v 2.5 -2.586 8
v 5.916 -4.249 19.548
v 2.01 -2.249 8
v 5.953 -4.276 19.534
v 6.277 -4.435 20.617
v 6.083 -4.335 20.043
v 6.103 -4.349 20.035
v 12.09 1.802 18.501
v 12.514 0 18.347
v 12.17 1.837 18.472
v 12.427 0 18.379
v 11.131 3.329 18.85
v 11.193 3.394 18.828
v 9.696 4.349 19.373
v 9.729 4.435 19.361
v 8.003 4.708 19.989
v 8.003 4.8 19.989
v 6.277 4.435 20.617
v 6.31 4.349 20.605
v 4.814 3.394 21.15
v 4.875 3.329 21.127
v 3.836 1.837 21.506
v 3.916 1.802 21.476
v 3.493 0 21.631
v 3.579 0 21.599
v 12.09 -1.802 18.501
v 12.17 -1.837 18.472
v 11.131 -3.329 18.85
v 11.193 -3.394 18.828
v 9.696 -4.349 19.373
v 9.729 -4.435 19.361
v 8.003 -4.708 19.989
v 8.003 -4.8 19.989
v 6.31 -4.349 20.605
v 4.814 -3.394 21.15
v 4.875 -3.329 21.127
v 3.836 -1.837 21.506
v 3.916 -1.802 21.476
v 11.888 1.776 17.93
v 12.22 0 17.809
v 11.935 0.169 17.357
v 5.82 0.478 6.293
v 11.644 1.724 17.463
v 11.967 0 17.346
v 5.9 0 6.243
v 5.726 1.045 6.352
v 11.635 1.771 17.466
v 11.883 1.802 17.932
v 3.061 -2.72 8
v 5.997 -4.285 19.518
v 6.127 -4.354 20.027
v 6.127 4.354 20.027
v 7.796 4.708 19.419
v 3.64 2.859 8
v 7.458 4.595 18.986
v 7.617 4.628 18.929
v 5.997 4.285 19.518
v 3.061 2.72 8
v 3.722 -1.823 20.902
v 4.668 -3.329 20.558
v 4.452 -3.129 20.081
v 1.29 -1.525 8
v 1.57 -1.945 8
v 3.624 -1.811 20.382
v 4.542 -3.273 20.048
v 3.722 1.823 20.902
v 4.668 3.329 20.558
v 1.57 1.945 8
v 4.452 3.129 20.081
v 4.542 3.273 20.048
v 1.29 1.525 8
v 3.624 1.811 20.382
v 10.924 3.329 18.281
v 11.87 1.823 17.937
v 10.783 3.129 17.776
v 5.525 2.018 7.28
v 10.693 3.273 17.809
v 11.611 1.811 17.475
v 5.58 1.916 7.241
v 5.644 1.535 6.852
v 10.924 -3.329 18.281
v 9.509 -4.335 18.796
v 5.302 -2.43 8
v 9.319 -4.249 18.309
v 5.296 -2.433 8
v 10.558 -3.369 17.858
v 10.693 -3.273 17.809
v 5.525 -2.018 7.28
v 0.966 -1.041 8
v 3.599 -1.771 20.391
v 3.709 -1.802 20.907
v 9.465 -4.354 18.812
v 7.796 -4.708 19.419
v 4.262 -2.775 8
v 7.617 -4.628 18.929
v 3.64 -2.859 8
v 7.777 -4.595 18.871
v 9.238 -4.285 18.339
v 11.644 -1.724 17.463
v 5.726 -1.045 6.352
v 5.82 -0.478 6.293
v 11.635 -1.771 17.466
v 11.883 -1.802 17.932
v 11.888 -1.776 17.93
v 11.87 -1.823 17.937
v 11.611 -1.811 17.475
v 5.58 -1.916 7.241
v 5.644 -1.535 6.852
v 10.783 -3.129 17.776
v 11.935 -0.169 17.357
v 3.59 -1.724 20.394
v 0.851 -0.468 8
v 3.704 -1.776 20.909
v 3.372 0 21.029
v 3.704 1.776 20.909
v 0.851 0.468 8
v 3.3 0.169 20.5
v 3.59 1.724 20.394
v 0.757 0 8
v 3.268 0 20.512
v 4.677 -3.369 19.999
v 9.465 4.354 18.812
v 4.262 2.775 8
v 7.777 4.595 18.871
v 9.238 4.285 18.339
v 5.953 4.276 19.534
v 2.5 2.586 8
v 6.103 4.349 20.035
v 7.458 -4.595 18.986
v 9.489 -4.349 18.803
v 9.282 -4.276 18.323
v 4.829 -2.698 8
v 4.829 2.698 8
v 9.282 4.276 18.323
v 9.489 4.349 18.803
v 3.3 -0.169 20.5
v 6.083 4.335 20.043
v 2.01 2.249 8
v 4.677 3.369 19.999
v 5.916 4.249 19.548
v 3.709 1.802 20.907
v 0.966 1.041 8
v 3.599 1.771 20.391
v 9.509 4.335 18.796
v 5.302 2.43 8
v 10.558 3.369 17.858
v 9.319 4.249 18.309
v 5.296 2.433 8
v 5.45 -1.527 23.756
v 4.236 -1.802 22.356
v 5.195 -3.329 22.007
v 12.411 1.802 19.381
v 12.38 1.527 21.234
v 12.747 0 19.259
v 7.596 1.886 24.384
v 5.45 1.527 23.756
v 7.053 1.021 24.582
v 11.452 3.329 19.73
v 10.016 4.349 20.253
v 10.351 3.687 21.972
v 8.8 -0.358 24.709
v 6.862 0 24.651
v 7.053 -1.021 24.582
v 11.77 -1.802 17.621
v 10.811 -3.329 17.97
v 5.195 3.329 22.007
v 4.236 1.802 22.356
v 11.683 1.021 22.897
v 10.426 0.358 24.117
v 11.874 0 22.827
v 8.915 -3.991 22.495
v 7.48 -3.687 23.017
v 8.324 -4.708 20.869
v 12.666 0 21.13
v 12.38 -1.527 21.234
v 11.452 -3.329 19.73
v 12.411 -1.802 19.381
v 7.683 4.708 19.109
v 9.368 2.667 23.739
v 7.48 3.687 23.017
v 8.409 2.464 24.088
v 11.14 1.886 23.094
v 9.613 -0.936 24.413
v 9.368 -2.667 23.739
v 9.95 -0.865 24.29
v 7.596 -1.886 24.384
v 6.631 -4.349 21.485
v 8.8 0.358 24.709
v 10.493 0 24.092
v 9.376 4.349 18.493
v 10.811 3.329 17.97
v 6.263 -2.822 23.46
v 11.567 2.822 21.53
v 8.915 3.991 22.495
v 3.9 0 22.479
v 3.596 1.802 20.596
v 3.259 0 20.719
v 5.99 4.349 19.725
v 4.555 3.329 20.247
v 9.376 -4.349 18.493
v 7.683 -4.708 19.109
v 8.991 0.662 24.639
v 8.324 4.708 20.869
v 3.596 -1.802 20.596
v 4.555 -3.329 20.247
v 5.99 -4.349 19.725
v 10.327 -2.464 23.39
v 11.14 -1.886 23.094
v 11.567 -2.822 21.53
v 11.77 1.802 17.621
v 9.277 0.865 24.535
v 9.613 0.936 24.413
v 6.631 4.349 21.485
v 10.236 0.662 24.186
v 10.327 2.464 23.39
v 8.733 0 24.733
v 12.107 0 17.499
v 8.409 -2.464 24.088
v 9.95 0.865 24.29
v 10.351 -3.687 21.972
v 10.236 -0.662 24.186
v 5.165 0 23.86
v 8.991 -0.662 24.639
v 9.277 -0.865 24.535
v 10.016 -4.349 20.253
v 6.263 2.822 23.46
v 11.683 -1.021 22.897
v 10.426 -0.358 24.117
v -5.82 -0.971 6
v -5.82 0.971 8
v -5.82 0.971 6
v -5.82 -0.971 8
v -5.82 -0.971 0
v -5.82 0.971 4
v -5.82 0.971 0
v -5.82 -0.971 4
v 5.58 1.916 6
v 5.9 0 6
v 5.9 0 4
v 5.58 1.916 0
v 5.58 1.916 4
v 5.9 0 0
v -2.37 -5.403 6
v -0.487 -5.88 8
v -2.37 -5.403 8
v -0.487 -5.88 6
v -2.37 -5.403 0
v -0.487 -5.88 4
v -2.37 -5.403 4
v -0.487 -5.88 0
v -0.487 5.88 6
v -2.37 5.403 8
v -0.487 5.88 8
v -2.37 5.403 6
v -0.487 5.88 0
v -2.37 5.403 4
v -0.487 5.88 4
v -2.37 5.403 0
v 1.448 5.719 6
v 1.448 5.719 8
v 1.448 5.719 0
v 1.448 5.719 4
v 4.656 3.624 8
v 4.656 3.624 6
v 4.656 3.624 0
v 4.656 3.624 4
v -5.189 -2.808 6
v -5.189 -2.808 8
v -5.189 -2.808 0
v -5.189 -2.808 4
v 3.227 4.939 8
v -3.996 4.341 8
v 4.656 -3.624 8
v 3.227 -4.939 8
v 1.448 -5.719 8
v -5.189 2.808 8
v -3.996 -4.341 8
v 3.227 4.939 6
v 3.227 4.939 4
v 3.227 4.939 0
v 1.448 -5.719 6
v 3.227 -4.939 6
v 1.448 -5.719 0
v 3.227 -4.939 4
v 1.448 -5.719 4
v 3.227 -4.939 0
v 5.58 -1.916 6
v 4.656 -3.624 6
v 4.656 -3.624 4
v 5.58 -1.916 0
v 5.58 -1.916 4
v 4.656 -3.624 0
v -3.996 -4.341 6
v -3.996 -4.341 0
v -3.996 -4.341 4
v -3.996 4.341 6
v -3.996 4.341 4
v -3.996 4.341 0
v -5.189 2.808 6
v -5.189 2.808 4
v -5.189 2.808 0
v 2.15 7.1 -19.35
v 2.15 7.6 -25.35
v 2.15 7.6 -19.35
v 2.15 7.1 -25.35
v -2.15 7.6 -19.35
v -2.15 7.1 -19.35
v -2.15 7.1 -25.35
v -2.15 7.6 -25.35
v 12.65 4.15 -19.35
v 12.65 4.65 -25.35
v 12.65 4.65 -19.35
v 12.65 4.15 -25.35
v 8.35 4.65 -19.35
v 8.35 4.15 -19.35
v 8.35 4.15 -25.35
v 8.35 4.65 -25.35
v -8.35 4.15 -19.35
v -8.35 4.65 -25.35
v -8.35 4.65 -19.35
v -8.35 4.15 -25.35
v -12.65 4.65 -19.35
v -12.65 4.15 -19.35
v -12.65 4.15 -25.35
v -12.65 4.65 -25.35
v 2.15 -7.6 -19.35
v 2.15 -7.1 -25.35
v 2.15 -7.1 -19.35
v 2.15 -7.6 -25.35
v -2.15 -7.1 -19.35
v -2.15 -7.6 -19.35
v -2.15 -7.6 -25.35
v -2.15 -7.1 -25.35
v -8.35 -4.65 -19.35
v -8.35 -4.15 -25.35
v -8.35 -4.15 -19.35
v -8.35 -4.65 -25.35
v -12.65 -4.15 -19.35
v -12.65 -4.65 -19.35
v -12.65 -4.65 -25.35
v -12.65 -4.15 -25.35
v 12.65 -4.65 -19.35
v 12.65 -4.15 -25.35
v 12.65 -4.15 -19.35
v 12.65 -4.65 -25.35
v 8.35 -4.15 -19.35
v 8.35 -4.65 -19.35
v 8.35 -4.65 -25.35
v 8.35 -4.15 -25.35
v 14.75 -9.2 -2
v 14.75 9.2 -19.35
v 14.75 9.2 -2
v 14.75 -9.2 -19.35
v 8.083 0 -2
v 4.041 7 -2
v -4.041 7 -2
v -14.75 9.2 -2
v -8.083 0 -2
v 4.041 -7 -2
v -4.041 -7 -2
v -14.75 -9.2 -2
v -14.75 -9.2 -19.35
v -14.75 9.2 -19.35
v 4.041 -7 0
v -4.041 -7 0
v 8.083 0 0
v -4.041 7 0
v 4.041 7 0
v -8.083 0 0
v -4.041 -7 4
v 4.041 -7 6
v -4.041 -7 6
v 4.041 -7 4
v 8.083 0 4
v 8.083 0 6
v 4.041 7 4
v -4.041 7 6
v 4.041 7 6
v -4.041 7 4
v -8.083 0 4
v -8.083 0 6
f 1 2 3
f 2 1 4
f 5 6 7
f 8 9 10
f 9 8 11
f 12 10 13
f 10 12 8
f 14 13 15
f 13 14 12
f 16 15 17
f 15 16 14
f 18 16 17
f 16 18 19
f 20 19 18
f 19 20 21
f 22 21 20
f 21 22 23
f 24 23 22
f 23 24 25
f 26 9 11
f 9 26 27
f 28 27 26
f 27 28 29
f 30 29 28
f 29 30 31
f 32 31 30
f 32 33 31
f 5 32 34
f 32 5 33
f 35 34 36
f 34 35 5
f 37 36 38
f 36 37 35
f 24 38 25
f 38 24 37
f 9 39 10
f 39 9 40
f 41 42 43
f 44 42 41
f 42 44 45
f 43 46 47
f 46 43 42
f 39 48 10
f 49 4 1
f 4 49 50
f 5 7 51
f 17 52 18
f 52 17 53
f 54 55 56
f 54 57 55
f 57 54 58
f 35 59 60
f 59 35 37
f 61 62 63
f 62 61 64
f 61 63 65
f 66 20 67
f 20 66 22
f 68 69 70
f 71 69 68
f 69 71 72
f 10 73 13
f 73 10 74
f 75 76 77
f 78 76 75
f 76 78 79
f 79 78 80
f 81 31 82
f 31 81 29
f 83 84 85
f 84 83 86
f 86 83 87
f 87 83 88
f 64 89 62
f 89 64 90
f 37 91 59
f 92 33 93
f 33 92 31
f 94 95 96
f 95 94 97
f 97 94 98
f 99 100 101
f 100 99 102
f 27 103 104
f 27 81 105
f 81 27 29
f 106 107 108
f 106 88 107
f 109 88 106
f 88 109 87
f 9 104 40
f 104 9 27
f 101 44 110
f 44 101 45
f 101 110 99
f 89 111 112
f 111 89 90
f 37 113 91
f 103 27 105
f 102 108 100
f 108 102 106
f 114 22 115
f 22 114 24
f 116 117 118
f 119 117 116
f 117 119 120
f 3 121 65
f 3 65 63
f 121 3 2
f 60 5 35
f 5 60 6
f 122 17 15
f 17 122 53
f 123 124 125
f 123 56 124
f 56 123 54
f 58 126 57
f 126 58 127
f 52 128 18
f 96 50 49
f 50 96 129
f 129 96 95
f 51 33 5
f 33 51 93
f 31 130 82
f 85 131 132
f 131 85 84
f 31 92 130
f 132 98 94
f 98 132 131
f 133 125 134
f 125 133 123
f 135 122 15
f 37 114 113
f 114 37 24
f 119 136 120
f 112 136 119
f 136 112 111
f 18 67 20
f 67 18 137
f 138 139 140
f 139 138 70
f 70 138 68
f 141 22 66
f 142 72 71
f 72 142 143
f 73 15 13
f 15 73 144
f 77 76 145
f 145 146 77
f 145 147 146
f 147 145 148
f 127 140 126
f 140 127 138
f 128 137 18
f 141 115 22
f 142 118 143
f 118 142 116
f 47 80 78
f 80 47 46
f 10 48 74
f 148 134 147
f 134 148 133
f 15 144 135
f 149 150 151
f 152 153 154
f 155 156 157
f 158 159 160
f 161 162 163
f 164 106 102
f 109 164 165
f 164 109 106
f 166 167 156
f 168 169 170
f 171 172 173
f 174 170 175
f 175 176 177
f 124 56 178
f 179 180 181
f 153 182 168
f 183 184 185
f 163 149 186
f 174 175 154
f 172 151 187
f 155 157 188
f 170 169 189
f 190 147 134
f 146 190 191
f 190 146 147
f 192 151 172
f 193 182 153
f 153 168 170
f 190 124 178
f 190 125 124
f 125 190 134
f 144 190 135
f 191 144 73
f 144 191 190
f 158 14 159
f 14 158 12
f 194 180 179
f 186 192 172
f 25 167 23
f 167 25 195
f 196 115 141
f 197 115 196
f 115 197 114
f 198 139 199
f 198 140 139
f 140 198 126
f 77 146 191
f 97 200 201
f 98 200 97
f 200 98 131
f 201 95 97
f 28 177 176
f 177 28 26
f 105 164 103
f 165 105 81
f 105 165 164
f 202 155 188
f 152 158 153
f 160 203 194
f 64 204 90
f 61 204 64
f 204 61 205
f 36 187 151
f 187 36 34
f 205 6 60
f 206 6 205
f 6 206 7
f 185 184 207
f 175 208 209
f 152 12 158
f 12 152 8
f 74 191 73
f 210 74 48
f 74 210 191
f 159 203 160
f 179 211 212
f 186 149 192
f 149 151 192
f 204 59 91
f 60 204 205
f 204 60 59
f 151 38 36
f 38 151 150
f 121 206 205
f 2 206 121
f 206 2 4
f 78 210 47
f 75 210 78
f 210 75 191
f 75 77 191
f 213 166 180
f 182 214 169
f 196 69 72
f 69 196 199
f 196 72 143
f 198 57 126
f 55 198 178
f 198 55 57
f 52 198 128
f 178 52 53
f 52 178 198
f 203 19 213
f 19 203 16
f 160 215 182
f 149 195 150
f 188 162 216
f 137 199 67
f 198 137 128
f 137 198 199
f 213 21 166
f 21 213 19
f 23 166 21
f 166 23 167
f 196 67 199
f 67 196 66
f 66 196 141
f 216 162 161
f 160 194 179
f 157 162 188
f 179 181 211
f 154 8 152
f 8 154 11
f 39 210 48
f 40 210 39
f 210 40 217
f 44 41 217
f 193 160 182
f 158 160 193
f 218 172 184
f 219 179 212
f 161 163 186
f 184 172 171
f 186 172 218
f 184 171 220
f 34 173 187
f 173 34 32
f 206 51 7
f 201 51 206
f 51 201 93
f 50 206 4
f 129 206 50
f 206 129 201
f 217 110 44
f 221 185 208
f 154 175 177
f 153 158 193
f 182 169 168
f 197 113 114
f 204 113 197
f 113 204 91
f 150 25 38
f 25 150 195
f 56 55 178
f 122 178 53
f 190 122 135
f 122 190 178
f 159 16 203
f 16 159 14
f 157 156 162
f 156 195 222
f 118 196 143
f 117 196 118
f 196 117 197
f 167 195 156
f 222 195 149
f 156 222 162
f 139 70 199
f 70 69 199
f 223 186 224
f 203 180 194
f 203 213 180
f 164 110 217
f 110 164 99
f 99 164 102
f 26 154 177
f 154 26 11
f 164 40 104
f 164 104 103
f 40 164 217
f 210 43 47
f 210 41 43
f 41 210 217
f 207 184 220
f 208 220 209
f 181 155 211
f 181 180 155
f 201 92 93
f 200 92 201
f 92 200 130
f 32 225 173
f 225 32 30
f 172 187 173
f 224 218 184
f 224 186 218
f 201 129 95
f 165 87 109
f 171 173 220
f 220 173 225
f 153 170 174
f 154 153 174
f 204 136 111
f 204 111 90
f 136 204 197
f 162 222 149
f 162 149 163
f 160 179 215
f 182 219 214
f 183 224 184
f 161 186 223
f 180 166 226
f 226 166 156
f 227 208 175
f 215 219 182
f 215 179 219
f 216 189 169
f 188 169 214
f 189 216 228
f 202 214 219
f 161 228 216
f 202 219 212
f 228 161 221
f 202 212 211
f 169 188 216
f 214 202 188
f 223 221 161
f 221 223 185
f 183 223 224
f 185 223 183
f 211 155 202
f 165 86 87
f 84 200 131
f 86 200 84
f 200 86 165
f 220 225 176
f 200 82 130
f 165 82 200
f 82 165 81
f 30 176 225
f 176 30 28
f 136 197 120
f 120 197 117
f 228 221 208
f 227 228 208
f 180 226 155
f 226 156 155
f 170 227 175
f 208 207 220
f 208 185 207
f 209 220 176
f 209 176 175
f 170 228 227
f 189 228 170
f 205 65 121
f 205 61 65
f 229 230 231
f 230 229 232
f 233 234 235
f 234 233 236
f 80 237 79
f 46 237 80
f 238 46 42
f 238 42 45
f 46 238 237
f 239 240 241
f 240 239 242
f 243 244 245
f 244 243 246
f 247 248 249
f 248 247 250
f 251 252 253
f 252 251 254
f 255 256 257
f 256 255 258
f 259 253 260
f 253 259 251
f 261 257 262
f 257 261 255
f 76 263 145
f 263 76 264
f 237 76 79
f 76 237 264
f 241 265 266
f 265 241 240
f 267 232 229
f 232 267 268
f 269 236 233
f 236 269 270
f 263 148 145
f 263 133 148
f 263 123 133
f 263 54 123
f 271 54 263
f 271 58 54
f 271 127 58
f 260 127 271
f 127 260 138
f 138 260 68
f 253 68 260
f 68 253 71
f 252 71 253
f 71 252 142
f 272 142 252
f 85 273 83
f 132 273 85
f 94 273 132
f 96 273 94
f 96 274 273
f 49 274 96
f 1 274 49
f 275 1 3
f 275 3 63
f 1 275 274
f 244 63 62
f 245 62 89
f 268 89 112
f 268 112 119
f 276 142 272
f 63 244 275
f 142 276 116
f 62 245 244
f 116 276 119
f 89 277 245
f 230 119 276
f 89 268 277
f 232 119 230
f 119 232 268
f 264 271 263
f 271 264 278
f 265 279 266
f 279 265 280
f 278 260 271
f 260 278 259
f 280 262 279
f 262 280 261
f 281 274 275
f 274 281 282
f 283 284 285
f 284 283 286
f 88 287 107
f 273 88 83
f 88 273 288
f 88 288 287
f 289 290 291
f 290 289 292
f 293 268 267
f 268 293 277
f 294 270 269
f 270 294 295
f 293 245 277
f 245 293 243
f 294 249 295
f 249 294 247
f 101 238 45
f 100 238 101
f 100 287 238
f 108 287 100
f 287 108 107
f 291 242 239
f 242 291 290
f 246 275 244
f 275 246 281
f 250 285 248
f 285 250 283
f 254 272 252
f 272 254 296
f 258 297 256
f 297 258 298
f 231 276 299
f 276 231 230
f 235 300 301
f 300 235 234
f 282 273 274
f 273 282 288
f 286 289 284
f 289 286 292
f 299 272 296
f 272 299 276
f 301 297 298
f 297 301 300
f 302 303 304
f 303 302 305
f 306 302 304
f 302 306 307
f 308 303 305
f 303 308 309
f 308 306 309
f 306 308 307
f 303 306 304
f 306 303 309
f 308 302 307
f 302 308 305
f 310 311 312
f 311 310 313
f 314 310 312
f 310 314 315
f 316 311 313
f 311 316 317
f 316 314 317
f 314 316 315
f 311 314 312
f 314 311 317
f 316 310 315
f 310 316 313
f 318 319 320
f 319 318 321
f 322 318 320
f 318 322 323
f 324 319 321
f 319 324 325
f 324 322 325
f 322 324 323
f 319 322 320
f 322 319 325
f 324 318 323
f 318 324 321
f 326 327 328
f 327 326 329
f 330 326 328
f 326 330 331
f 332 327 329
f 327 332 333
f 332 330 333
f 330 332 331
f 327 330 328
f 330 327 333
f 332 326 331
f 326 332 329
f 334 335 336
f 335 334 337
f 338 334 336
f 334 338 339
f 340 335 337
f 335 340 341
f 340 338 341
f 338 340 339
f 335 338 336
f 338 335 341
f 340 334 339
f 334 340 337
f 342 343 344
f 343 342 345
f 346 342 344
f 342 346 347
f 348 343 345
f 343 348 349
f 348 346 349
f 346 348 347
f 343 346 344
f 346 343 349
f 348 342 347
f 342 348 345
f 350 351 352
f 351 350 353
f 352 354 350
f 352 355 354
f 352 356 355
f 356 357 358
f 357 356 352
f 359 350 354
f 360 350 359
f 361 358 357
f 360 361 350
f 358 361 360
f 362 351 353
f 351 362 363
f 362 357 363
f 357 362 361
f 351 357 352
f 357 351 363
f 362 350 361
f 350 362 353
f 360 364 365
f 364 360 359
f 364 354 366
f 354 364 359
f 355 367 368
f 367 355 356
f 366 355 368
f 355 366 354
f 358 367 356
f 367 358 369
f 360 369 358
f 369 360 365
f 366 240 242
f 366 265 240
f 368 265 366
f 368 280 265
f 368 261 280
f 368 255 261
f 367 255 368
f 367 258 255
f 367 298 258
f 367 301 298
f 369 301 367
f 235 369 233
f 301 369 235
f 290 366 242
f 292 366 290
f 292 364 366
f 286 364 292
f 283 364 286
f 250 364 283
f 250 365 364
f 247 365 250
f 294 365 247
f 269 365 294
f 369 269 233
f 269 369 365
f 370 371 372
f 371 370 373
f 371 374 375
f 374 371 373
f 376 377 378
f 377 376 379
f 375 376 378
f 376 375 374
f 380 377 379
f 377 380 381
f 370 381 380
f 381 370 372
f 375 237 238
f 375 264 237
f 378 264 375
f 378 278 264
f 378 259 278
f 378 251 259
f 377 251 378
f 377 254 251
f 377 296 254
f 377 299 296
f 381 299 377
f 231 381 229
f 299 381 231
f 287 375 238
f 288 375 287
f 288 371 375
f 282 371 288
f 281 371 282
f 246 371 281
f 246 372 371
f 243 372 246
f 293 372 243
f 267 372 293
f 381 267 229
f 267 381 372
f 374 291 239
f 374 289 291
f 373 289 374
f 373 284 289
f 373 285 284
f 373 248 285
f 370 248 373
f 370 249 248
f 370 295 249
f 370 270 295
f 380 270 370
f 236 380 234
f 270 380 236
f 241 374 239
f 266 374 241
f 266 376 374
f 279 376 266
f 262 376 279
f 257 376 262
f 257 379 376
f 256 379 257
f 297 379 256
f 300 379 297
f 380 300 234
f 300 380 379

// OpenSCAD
/*
  Toggle Switch Library

  Aaron Ciuffo - aaron . ciuffo 2 gmail com

  2014 Nov 15

  Paramaters:
    nut1H - height of nut 1 on screw 
    nut2H - height of nut 2 OVER nut 1
    cener = body/nut


*/

/*[Base Dimensions]*/
bX=29.5;
bY=18.4;
bZ=17.35;

/*[Tabs]*/
//Dimensions
tabX=4.3;
tabY=0.5;
tabZ=6;
//position of center terminals
centerX=0;
centerY=14.7/2;
endX=21/2;
endY=8.8/2;


/*[Screw Mount]*/
screwDia=11.8;
screwZ=10;

/*[Toggle Dimensions]*/
tgDia2=4.8; //diamter at top
tgDia1=2; //diameter at bottom
tgZ=13.4;
swAngle=20;

/*[Mounting Nut]*/
nutFlat=14; //distance across flats
nutThick=2; //thickness

module body() {
  translate([]) 
    cube([bX, bY, bZ], center=true);
}

module toggle() {
  union() {
    cylinder(h=screwZ, r=screwDia/2);
    rotate([0, swAngle, 0])
    union() {
      translate([0, 0, screwZ-5]) rotate([0, 0, 0])
        cylinder(h=tgZ+5, r1=tgDia1, r2=tgDia2);
      translate([0, 0, screwZ+tgZ])
        sphere(r=tgDia2, center=true);
    }

  }
}

module nut() {
  nutRad=nutFlat/2*1/cos(30);
  cylinder(r=nutRad, h=nutThick, $fn=6);
}


module tab() {
  cube([tabX, tabY, tabZ], center=true);
}

module placeTabs(mir=1) {
  //center terminal
  translate([mir*centerX, mir*centerY, 0])
    tab();
  translate([mir*endX, mir*endY, 0])
    tab();
  translate([-1*mir*endX, mir*endY, 0])
    tab();
}

module assemble(nut1H=0, nut2H=nutThick) {
  union() {
    color("gray") body();
    translate([0, 0, bZ/2])
      color("blue") toggle();
    translate([0, 0, -bZ/2-tabZ/2])
      color("silver") placeTabs();
    translate([0, 0, -bZ/2-tabZ/2])
      color("silver") placeTabs(mir=-1);
    translate([0, 0, bZ/2+nut1H])
      color("red") nut();
    translate([0, 0, bZ/2+nut2H+nutThick
    ])
      color("yellow") nut();

  }

}

module switch(nut1H=0, nut2H=nutThick, center="body") {
  if (center=="nut") {
    translate([0, 0, -bZ/2-nut1H-nutThick])
      assemble(nut1H, nut2H);
    
  } else {
    assemble(nut1H, nut2H);
  }
}


switch(nut1H=0, nut2H=4, center="nut");
